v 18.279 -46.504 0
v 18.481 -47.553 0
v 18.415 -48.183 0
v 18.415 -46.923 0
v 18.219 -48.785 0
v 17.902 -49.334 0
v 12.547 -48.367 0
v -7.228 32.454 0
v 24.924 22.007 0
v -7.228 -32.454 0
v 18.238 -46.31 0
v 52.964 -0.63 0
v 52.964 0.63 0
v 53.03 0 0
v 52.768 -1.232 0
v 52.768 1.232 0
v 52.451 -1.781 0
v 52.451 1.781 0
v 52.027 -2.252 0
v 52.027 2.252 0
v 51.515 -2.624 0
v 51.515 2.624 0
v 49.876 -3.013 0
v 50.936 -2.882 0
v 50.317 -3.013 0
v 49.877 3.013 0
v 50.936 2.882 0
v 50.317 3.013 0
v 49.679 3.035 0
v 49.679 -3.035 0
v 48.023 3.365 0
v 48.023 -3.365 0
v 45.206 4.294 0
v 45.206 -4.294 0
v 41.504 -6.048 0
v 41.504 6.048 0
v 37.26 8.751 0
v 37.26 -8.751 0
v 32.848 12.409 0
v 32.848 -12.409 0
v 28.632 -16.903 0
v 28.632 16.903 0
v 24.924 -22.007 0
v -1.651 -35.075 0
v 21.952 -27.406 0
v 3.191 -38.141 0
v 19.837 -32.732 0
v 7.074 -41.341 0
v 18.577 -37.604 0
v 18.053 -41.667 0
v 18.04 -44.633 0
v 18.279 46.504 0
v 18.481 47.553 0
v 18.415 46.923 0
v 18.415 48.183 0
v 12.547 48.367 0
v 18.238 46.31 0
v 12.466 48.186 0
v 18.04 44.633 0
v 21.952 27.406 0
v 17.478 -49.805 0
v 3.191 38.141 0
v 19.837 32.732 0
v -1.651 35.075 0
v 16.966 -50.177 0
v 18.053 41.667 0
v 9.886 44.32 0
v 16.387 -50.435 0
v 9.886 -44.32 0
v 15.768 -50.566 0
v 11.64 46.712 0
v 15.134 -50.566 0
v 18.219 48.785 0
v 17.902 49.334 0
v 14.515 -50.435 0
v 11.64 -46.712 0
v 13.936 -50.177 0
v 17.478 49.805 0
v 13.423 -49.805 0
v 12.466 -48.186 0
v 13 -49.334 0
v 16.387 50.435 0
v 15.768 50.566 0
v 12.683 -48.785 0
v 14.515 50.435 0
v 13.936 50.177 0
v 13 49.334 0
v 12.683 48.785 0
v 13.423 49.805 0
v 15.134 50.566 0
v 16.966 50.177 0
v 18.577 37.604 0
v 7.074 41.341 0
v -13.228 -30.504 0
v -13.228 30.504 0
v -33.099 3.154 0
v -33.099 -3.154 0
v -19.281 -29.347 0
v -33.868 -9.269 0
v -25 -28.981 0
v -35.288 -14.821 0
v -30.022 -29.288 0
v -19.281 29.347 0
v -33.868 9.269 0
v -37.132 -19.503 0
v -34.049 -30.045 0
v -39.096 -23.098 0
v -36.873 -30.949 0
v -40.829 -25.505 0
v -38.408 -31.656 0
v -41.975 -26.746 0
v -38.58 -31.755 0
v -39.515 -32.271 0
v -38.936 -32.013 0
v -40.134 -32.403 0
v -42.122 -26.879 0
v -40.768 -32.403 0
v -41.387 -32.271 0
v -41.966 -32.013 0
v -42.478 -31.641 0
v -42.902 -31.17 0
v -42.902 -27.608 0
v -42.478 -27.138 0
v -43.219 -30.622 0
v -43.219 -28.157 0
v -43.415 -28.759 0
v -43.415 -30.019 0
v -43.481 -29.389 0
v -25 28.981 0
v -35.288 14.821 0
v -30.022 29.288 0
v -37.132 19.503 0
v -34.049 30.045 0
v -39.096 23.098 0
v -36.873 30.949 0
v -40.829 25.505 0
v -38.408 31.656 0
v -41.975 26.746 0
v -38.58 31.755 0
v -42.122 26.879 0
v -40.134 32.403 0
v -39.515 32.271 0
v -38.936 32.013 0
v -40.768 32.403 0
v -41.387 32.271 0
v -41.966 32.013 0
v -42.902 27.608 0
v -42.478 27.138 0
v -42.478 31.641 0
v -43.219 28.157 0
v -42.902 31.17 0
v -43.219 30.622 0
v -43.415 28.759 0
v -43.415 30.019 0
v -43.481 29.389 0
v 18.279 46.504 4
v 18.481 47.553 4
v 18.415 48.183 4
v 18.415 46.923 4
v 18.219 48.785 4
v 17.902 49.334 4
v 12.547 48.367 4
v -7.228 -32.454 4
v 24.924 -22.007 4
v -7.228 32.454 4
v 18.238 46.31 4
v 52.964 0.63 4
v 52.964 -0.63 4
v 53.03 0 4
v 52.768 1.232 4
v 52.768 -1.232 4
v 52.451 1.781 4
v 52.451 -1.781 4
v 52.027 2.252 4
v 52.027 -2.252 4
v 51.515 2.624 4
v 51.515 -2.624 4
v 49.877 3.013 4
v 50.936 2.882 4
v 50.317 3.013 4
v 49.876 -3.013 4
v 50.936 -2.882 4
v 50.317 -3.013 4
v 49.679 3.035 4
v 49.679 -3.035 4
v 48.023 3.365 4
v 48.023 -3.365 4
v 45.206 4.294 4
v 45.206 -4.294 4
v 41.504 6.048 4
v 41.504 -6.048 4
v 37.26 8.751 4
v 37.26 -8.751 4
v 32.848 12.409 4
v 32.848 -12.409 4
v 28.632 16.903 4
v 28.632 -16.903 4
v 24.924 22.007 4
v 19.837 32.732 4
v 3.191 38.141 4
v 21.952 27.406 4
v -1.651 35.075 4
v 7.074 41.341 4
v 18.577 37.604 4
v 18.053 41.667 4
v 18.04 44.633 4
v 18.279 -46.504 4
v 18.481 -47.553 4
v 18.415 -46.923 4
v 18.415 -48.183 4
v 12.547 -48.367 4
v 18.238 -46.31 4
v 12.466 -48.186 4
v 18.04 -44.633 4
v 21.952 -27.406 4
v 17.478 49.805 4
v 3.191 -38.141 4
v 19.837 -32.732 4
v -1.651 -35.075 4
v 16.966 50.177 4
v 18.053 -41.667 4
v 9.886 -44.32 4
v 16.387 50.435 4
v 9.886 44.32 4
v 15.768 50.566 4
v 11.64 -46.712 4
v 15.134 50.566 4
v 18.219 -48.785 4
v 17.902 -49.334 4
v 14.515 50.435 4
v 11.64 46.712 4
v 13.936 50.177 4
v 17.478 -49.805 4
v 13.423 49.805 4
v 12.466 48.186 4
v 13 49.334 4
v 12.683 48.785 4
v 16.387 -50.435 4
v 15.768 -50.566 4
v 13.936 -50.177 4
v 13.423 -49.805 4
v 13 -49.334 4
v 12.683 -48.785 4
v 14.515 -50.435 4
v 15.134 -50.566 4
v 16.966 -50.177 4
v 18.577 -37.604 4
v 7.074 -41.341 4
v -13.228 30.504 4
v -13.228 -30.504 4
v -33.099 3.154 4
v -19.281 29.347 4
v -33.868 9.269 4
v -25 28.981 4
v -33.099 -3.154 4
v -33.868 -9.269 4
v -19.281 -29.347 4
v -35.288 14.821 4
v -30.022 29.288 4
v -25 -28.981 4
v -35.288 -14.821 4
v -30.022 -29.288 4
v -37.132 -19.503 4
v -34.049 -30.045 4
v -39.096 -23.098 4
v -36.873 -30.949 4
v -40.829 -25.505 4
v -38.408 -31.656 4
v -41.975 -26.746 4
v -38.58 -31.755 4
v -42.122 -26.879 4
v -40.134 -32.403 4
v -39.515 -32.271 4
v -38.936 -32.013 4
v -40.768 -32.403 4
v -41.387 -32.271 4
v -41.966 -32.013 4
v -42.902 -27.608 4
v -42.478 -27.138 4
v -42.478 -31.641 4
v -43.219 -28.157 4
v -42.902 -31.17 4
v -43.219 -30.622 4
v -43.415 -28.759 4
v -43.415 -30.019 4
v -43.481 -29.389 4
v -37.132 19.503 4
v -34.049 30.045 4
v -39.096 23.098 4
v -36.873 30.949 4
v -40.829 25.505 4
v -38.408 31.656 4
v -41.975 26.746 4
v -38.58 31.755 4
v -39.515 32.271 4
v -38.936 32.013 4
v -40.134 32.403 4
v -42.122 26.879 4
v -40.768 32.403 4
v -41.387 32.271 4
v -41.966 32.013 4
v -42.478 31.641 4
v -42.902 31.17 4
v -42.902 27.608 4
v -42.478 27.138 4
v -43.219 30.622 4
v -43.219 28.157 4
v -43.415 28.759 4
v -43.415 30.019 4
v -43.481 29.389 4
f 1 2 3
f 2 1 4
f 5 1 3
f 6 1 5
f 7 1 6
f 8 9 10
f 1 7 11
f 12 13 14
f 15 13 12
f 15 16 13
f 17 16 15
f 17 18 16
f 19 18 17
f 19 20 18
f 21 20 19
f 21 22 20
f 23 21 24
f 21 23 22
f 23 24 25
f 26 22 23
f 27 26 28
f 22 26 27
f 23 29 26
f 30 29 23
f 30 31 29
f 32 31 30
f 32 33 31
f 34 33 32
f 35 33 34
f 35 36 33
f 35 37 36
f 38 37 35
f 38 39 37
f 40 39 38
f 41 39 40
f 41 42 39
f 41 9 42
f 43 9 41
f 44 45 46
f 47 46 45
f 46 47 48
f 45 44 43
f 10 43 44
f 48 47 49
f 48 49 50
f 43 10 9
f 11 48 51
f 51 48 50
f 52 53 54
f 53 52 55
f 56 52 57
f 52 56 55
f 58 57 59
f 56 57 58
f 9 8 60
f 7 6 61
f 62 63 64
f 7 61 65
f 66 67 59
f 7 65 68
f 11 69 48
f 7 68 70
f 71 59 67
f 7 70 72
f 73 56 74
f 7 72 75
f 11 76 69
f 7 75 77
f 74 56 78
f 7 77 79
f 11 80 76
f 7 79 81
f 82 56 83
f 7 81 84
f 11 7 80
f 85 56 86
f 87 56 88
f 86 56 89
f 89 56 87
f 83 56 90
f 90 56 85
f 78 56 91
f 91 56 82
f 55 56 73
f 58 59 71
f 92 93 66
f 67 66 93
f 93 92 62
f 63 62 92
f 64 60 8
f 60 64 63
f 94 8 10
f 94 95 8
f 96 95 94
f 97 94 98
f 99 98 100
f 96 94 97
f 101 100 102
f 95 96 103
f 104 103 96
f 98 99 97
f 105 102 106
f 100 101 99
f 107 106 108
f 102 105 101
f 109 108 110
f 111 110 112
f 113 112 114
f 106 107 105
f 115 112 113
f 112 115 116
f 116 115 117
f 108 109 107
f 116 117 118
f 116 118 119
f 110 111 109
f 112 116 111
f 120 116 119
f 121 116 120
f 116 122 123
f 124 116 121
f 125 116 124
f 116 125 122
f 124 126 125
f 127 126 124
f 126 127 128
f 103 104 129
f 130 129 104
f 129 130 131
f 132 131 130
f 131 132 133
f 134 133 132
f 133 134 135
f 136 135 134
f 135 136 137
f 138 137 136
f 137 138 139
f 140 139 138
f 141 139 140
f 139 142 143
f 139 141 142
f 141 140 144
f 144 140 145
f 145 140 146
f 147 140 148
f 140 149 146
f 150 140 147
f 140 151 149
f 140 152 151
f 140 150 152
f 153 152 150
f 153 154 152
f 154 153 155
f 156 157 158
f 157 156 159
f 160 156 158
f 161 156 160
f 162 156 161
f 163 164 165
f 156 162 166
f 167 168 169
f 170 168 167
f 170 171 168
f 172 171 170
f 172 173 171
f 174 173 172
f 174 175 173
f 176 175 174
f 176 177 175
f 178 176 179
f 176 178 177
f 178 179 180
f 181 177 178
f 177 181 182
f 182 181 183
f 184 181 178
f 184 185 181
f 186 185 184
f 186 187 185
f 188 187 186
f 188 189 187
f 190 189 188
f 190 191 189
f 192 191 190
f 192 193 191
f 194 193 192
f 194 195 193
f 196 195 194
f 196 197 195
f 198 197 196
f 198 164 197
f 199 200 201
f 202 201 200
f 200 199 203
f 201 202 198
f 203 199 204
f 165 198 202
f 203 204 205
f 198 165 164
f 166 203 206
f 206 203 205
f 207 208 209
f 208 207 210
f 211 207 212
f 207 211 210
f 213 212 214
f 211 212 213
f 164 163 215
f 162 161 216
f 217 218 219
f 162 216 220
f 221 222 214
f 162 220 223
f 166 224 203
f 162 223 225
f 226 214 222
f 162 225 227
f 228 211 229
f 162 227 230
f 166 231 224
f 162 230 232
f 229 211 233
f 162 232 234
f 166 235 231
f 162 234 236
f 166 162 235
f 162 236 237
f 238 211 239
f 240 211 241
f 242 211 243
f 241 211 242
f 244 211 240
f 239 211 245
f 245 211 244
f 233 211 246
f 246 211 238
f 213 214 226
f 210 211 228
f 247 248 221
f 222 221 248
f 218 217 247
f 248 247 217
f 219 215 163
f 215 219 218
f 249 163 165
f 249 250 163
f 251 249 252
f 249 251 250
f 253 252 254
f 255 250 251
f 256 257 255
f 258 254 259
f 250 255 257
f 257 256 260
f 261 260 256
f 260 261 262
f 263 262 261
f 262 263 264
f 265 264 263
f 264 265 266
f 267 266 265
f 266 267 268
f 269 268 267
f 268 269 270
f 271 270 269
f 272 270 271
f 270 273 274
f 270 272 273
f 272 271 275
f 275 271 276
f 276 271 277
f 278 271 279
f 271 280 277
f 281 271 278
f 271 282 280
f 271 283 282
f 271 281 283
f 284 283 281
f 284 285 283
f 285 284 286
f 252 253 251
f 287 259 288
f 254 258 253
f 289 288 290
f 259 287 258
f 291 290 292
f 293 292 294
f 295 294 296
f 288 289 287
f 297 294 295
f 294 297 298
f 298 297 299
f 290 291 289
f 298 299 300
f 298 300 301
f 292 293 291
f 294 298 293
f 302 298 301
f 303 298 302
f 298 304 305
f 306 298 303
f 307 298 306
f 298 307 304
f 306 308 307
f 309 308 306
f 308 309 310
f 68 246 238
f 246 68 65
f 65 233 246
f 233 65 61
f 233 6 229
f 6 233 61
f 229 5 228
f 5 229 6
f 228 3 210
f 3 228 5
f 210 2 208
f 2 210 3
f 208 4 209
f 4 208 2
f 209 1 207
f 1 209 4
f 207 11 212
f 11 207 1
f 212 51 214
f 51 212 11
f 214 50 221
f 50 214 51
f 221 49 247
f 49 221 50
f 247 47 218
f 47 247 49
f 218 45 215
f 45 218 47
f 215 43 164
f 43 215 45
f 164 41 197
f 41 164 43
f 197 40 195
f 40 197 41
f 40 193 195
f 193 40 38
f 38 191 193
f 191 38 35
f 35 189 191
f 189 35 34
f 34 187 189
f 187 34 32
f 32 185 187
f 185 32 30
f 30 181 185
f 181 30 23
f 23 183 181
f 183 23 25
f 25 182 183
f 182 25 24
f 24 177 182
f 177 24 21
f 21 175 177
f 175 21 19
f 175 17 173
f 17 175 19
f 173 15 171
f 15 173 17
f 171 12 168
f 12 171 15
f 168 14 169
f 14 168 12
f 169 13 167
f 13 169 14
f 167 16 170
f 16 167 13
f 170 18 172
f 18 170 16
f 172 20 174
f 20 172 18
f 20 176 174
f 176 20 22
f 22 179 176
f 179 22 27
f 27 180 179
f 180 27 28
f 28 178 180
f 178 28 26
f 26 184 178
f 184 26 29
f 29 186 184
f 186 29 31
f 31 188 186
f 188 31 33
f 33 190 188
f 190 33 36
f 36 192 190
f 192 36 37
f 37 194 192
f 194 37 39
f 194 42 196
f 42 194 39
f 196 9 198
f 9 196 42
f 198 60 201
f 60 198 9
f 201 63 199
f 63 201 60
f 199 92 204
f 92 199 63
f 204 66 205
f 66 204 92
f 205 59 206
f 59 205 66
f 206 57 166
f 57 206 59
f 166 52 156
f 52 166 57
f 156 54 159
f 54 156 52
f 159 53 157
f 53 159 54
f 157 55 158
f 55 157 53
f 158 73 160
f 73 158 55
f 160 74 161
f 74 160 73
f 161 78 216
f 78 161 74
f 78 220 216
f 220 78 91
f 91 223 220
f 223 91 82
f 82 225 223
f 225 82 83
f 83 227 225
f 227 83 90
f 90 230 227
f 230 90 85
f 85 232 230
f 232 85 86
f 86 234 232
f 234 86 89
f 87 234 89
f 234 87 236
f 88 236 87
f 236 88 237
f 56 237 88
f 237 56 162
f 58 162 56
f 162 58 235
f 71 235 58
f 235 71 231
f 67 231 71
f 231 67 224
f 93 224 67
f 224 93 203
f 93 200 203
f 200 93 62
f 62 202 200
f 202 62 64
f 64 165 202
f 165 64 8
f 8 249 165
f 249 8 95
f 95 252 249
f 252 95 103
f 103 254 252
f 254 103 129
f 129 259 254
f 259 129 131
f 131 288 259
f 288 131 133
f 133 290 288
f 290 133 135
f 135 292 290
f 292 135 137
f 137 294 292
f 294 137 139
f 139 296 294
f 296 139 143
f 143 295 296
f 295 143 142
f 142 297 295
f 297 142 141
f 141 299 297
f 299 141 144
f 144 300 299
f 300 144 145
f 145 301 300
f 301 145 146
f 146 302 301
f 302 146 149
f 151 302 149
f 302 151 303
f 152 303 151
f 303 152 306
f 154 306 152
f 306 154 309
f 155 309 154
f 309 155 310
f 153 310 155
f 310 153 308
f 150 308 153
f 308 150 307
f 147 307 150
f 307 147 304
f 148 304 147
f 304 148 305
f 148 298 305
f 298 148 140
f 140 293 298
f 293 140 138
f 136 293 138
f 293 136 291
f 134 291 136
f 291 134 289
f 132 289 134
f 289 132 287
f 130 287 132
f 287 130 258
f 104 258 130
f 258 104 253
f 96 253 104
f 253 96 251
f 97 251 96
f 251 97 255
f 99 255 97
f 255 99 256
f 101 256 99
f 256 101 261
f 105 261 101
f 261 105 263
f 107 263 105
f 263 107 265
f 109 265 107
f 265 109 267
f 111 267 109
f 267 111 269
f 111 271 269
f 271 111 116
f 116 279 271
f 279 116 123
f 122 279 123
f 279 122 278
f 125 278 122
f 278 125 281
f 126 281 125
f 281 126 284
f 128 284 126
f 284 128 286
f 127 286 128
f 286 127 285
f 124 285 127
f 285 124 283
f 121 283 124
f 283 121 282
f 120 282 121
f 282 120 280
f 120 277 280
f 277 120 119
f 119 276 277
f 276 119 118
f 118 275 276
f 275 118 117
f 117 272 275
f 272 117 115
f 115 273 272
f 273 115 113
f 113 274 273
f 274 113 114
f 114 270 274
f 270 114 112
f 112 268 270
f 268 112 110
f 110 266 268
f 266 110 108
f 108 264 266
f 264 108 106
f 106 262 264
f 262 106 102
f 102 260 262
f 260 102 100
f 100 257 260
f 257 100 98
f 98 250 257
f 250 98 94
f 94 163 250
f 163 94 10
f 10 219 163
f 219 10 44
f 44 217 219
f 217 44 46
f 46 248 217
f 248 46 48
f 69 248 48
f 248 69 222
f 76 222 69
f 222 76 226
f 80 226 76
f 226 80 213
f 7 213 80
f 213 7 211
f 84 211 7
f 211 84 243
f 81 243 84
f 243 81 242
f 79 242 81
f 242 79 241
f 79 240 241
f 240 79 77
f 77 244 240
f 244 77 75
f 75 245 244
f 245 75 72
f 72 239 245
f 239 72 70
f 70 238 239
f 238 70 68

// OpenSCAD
// file: ../../../../reference/oomlout_opsc_version_3/cycloid.scad
$fn = 30;


//source https://www.thingiverse.com/thing:8348

lobe_number = 30;
radius_offset = 1.5;
radius_pin = 6/2;

cycloid(lobe_number, radius_offset, radius_pin);


module cycloid (lobe_number, radius_offset, radius_pin){
	//hypotrochoidBandFast(n, r, thickness, r_off)
	hypotrochoidBandFast(lobe_number, radius_offset, 6, radius_pin);
}


module hypotrochoidBandFast(n, r, thickness, r_off) {
    
    pi = 3.14159265;

	R = r*n;
	d = r;

	// set to 1 for normal size cylinders.  this will leave a tiny cusp in some cases that does
	// not blend in to cylinders.  see below for details.  make hideCuspFactor larger to scale up
	// the cylinders slightly. 1.01 seems to work OK.
	hideCuspFactor = 1.01;

	// dth stands for dtheta - i.e. a small change of the angle "theta"
	// there are 14 intermediate points on the curve, so a wedge is
	// divided into 14 + 1 = 15.  You may be tempted to change this, but it really is 15.
	dth = 360/n/15;

	// X points on base hypotrochoid
	xbStart = (R-r) + d;
	xbEnd =  (R-r)*cos(360/n) + d*cos((R-r)/r*360/n);	

	// Instead of an array and a for-loop we just hard-code these 
	// intermediate points, this if for X coords on the base hypocycloid.
	//
	xb1 = (R-r)*cos(dth*1) + d*cos((R-r)/r*dth*1);
	xb2 = (R-r)*cos(dth*2) + d*cos((R-r)/r*dth*2);
	xb3 = (R-r)*cos(dth*3) + d*cos((R-r)/r*dth*3);
	xb4 = (R-r)*cos(dth*4) + d*cos((R-r)/r*dth*4);
	xb5 = (R-r)*cos(dth*5) + d*cos((R-r)/r*dth*5);
	xb6 = (R-r)*cos(dth*6) + d*cos((R-r)/r*dth*6);
	xb7 = (R-r)*cos(dth*7) + d*cos((R-r)/r*dth*7);	
	xb8 = (R-r)*cos(dth*8) + d*cos((R-r)/r*dth*8);
	xb9 = (R-r)*cos(dth*9) + d*cos((R-r)/r*dth*9);
	xb10 = (R-r)*cos(dth*10) + d*cos((R-r)/r*dth*10);
	xb11 = (R-r)*cos(dth*11) + d*cos((R-r)/r*dth*11);
	xb12 = (R-r)*cos(dth*12) + d*cos((R-r)/r*dth*12);
	xb13 = (R-r)*cos(dth*13) + d*cos((R-r)/r*dth*13);
	xb14 = (R-r)*cos(dth*14) + d*cos((R-r)/r*dth*14);	

	// Y points on base hypotrochoid
	ybStart = 0;
	ybEnd =   (R-r)*sin(360/n) - d*sin((R-r)/r*360/n);

	// Instead of an array and a for-loop we just hard-code these 
	// intermediate points, this if for Y coords on the base hypocycloid.
	//
	yb1 =  (R-r)*sin(dth*1) - d*sin((R-r)/r*dth*1);
	yb2 =  (R-r)*sin(dth*2) - d*sin((R-r)/r*dth*2);
	yb3 =  (R-r)*sin(dth*3) - d*sin((R-r)/r*dth*3);
	yb4 =  (R-r)*sin(dth*4) - d*sin((R-r)/r*dth*4);
	yb5 =  (R-r)*sin(dth*5) - d*sin((R-r)/r*dth*5);
	yb6 =  (R-r)*sin(dth*6) - d*sin((R-r)/r*dth*6);
	yb7 =  (R-r)*sin(dth*7) - d*sin((R-r)/r*dth*7);
	yb8 =  (R-r)*sin(dth*8) - d*sin((R-r)/r*dth*8);
	yb9 =  (R-r)*sin(dth*9) - d*sin((R-r)/r*dth*9);
	yb10 =  (R-r)*sin(dth*10) - d*sin((R-r)/r*dth*10);
	yb11 =  (R-r)*sin(dth*11) - d*sin((R-r)/r*dth*11);
	yb12 =  (R-r)*sin(dth*12) - d*sin((R-r)/r*dth*12);
	yb13 =  (R-r)*sin(dth*13) - d*sin((R-r)/r*dth*13);
	yb14 =  (R-r)*sin(dth*14) - d*sin((R-r)/r*dth*14);

	// Now we do the offset points.  The tangent to the
	// hypotrochoid is [dx/dtheta, dy/dtheta].
	// We take the tangent, normalize it, rotate it, and scale it 
	// to get the offsets in X and Y coords.
	
	// X offset points
	xfStart = 0;
	xfEnd =  r_off*cos(360/n - 90);

	// hard-coded offset points for X
	//
	xf1 = (R-r)*cos(dth*1) - r*cos( (R-r)/r*dth*1) * (R-r)/r ;
	xf2 = (R-r)*cos(dth*2) - r*cos( (R-r)/r*dth*2) * (R-r)/r ;
	xf3 = (R-r)*cos(dth*3) - r*cos( (R-r)/r*dth*3) * (R-r)/r ;
	xf4 = (R-r)*cos(dth*4) - r*cos( (R-r)/r*dth*4) * (R-r)/r ;
	xf5 = (R-r)*cos(dth*5) - r*cos( (R-r)/r*dth*5) * (R-r)/r ;
	xf6 = (R-r)*cos(dth*6) - r*cos( (R-r)/r*dth*6) * (R-r)/r ;
	xf7 = (R-r)*cos(dth*7) - r*cos( (R-r)/r*dth*7) * (R-r)/r ;	
	xf8 = (R-r)*cos(dth*8) - r*cos( (R-r)/r*dth*8) * (R-r)/r ;
	xf9 = (R-r)*cos(dth*9) - r*cos( (R-r)/r*dth*9) * (R-r)/r ;
	xf10 = (R-r)*cos(dth*10) - r*cos( (R-r)/r*dth*10) * (R-r)/r ;
	xf11 = (R-r)*cos(dth*11) - r*cos( (R-r)/r*dth*11) * (R-r)/r ;
	xf12 = (R-r)*cos(dth*12) - r*cos( (R-r)/r*dth*12) * (R-r)/r ;
	xf13 = (R-r)*cos(dth*13) - r*cos( (R-r)/r*dth*13) * (R-r)/r ;
	xf14 = (R-r)*cos(dth*14) - r*cos( (R-r)/r*dth*14) * (R-r)/r ;	

	// Y offset points
	yfStart = r_off;
	yfEnd =  r_off*sin(360/n - 90);

	yf1 =  (R-r)*sin(dth*1) + r*sin( (R-r)/r*dth*1) * (R-r)/r ;
	yf2 =  (R-r)*sin(dth*2) + r*sin( (R-r)/r*dth*2) * (R-r)/r ;
	yf3 =  (R-r)*sin(dth*3) + r*sin( (R-r)/r*dth*3) * (R-r)/r ;
	yf4 =  (R-r)*sin(dth*4) + r*sin( (R-r)/r*dth*4) * (R-r)/r ;
	yf5 =  (R-r)*sin(dth*5) + r*sin( (R-r)/r*dth*5) * (R-r)/r ;
	yf6 =  (R-r)*sin(dth*6) + r*sin( (R-r)/r*dth*6) * (R-r)/r ;
	yf7 =  (R-r)*sin(dth*7) + r*sin( (R-r)/r*dth*7) * (R-r)/r ;
	yf8 =  (R-r)*sin(dth*8) + r*sin( (R-r)/r*dth*8) * (R-r)/r ;
	yf9 =  (R-r)*sin(dth*9) + r*sin( (R-r)/r*dth*9) * (R-r)/r ;
	yf10 =  (R-r)*sin(dth*10) + r*sin( (R-r)/r*dth*10) * (R-r)/r ;
	yf11 =  (R-r)*sin(dth*11) + r*sin( (R-r)/r*dth*11) * (R-r)/r ;
	yf12 =  (R-r)*sin(dth*12) + r*sin( (R-r)/r*dth*12) * (R-r)/r ;
	yf13 =  (R-r)*sin(dth*13) + r*sin( (R-r)/r*dth*13) * (R-r)/r ;
	yf14 =  (R-r)*sin(dth*14) + r*sin( (R-r)/r*dth*14) * (R-r)/r ;

	m1 = sqrt(xf1*xf1 + yf1*yf1)/r_off;
	m2 = sqrt(xf2*xf2 + yf2*yf2)/r_off;
	m3 = sqrt(xf3*xf3 + yf3*yf3)/r_off;
	m4 = sqrt(xf4*xf4 + yf4*yf4)/r_off;
	m5 = sqrt(xf5*xf5 + yf5*yf5)/r_off;
	m6 = sqrt(xf6*xf6 + yf6*yf6)/r_off;
	m7 = sqrt(xf7*xf7 + yf7*yf7)/r_off;
	m8 = sqrt(xf8*xf8 + yf8*yf8)/r_off;
	m9 = sqrt(xf9*xf9 + yf9*yf9)/r_off;
	m10 = sqrt(xf10*xf10 + yf10*yf10)/r_off;
	m11 = sqrt(xf11*xf11 + yf11*yf11)/r_off;
	m12 = sqrt(xf12*xf12 + yf12*yf12)/r_off;
	m13 = sqrt(xf13*xf13 + yf13*yf13)/r_off;
	m14 = sqrt(xf14*xf14 + yf14*yf14)/r_off;

// Now that we have the points, we make a polygon and extrude it.
    union(){}
		for  ( i = [0:n-1] ) {
			rotate([0,0, 360/n*i]) {

					// the first point in the polygon is moved slightly off the origin
					polygon(points= [
						[-R/20 * cos(360/n/2) , -R/20 * sin(360/n/2)],
						[xbStart, ybStart],
						[xbStart + xfStart, ybStart + yfStart], 

						[xb1 + xf1/m1, yb1 + yf1/m1], 
						[xb2 + xf2/m2, yb2 + yf2/m2], 
						[xb3 + xf3/m3, yb3 + yf3/m3], 
						[xb4 + xf4/m4, yb4 + yf4/m4], 
						[xb5 + xf5/m5, yb5 + yf5/m5], 
						[xb6 + xf6/m6, yb6 + yf6/m6], 
						[xb7 + xf7/m7, yb7 + yf7/m7], 
						[xb8 + xf8/m8, yb8 + yf8/m8], 
						[xb9 + xf9/m9, yb9 + yf9/m9], 
						[xb10 + xf10/m10, yb10 + yf10/m10], 
						[xb11 + xf11/m11, yb11 + yf11/m11], 
						[xb12 + xf12/m12, yb12 + yf12/m12], 
						[xb13 + xf13/m13, yb13 + yf13/m13], 
						[xb14 + xf14/m14, yb14 + yf14/m14], 

						[xbEnd + xfEnd, ybEnd + yfEnd],
						[xbEnd, ybEnd]],
						paths = [[0,19,18,17,16,15,14,13,12,11,10,9,8,7,6,5,4,3,2,1]],
						convexity = 10);

			// If you look at just the wedge extruded above, without the cylinders below,
			// you can see a small cusp as the band radius gets larger.  The radius of 
			// the cylinder is manually increased a slight bit so that the cusp is contained 
			// within the cylinder.  With unlimited resolution, the cusp and cylinder would
			// blend together perfectly (I think), but this workaround is needed because
			// we are only using piecewise linear approximations to these curves.
			
			translate([xbStart, ybStart, 0])
				//cylinder(r = hideCuspFactor*r_off, h = thickness, center = true);
				circle(r = hideCuspFactor*r_off);
        
	    } //end rotate

    } //end for




} // end module hypotrochoidBandFast
//=========================================== 
// main file
$fn = 50;

use <../../../../reference/oomlout_opsc_version_3/cycloid.scad>;

difference() {
	union() {
		linear_extrude(height = 4) {
			cycloid(lobe_number = 5, radius_offset = 10, radius_pin = 3);
		}
	}
	union();
}
